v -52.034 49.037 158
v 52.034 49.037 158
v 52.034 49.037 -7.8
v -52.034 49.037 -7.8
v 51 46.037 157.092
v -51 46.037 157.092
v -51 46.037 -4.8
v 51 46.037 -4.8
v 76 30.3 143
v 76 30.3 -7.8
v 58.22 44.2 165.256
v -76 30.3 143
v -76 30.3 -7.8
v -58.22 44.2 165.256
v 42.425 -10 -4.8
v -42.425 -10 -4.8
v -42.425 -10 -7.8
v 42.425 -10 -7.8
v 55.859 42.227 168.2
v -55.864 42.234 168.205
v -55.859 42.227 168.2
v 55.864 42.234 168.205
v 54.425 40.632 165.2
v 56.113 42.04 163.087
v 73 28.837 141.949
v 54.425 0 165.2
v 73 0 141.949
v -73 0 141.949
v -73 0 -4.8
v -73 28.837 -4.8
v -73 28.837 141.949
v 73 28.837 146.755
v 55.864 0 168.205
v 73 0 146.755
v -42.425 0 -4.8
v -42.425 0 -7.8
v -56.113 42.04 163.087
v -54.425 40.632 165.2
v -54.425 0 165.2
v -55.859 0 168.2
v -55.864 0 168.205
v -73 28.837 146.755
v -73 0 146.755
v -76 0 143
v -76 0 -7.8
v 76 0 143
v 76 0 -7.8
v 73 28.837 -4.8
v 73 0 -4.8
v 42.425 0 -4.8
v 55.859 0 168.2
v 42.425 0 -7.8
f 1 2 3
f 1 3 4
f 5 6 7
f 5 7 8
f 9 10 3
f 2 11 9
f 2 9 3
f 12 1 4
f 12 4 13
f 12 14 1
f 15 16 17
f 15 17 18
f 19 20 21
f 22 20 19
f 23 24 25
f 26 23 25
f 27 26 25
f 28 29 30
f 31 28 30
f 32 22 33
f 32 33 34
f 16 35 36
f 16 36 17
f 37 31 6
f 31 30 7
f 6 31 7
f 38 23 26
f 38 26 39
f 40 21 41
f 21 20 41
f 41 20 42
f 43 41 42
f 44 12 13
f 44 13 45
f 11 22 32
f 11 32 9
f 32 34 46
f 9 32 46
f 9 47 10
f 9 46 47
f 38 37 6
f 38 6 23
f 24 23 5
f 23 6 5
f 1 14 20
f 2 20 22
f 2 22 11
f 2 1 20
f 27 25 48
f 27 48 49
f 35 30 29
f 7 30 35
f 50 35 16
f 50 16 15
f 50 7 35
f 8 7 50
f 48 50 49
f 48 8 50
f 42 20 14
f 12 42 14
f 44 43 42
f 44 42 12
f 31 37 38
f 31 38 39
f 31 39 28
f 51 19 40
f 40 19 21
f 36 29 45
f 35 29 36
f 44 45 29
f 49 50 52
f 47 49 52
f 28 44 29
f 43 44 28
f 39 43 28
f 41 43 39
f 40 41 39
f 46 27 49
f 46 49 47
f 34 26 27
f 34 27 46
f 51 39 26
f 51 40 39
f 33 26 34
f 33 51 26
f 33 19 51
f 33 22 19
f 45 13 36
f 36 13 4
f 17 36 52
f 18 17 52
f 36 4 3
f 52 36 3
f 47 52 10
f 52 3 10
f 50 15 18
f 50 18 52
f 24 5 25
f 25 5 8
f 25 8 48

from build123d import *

# Parameters (mm, degrees)
Y_KSEKLIK_EKSTR_ZYON1_DEPTH      = 173
Y_KSEKLIK_EKSTR_ZYON1_DEPTH_BACK = 4.8
KES_EKSTR_ZYON3_DEPTH            = 196.216977169
KES_EKSTR_ZYON3_DEPTH_BACK       = 196.216977169
KES_EKSTR_ZYON6_DEPTH            = 196.216977169
KES_EKSTR_ZYON6_DEPTH_BACK       = 196.216977169
Y_KSEKLIK_EKSTR_ZYON3_DEPTH      = 3
Y_KSEKLIK_EKSTR_ZYON4_DEPTH      = 3
Y_KSEKLIK_EKSTR_ZYON5_DEPTH      = 3
IZIM12_W                         = 111.728887866
IZIM12_H                         = 42.234305359
Y_KSEKLIK_EKSTR_ZYON6_DEPTH      = 3
Y_KSEKLIK_EKSTR_ZYON7_DEPTH      = 3


with BuildPart() as part:
    # Çizim1 → Yükseklik-Ekstrüzyon1 (new, two sides: drawn at the far end of the back side and taken through both)
    with BuildSketch(Plane.XY.offset(-Y_KSEKLIK_EKSTR_ZYON1_DEPTH_BACK)):
        Polygon((52.033537584, 49.037416071), (-52.033537584, 49.037416071), (-76, 30.3), (-76, 0), (-73, 0), (-73, 28.837416071), (-51, 46.037416071), (51, 46.037416071), (73, 28.837416071), (73, 0), (76, 0), (76, 30.3), align=None)
    extrude(amount=Y_KSEKLIK_EKSTR_ZYON1_DEPTH + Y_KSEKLIK_EKSTR_ZYON1_DEPTH_BACK)

    # Çizim5 → Kes-Ekstrüzyon3 (cut, two sides: drawn at the far end of the back side and taken through both)
    with BuildSketch(Plane(origin=(0, 0, 0), x_dir=(0, 0, -1), z_dir=(1, 0, 0)).offset(-KES_EKSTR_ZYON3_DEPTH_BACK)):
        Polygon((-158, 49.037416071), (-173, 39.037416071), (-173, 49.037416071), align=None)
    extrude(amount=KES_EKSTR_ZYON3_DEPTH + KES_EKSTR_ZYON3_DEPTH_BACK, mode=Mode.SUBTRACT)

    # Çizim6 → Kes-Ekstrüzyon6 (cut, two sides: drawn at the far end of the back side and taken through both)
    with BuildSketch(Plane(origin=(0, 0, 0), x_dir=(1, 0, 0), z_dir=(0, 1, 0)).offset(-KES_EKSTR_ZYON6_DEPTH_BACK)):
        Polygon((76, -143), (76, -173), (52.033537584, -173), align=None)
        Polygon((-52.033537584, -173), (-76, -143), (-76, -173), align=None)
    extrude(amount=KES_EKSTR_ZYON6_DEPTH + KES_EKSTR_ZYON6_DEPTH_BACK, mode=Mode.SUBTRACT)

    # Çizim7 → Yükseklik-Ekstrüzyon3 (add)
    with BuildSketch(Plane(origin=(0, 106.87205728, 71.248038187), x_dir=(1, 0, 0), z_dir=(0, 0.8320502943378435, 0.5547001962252296))):
        Polygon((-55.864443933, -116.52736444), (55.864443933, -116.52736444), (58.220440286, -112.982967479), (52.033537584, -104.262882189), (-52.033537584, -104.262882189), (-58.220440286, -112.982967479), align=None)
    extrude(amount=-Y_KSEKLIK_EKSTR_ZYON3_DEPTH)

    # Çizim9 → Yükseklik-Ekstrüzyon4 (add)
    with BuildSketch(Plane(origin=(-116.126649253, 0, 92.771499161), x_dir=(0.6241623263226247, 0, 0.7812946885775748), z_dir=(-0.7812946885775748, 0, 0.6241623263226247))):
        Polygon((92.774277659, 44.200383049), (96.548930908, 42.234305359), (96.548930908, 0), (64.288803666, 0), (64.288803666, 30.3), align=None)
    extrude(amount=-Y_KSEKLIK_EKSTR_ZYON4_DEPTH)

    # Çizim10 → Yükseklik-Ekstrüzyon5 (add)
    with BuildSketch(Plane(origin=(116.126649253, 0, 92.771499161), x_dir=(0.6241623263226247, 0, -0.7812946885775748), z_dir=(0.7812946885775748, 0, 0.6241623263226247))):
        Polygon((-96.548930908, 42.234305359), (-96.548930908, 0), (-64.288803666, 0), (-64.288803666, 30.3), (-92.774277659, 44.200383049), align=None)
    extrude(amount=-Y_KSEKLIK_EKSTR_ZYON5_DEPTH)

    # Çizim12 → Yükseklik-Ekstrüzyon6 (add)
    with BuildSketch(Plane(origin=(0, 0, 168.2), x_dir=(-1, 0, 0), z_dir=(0, 0, -1))):
        with Locations((0, 21.11715268)):
            Rectangle(IZIM12_W, IZIM12_H)
    extrude(amount=Y_KSEKLIK_EKSTR_ZYON6_DEPTH)

    # Çizim13 → Yükseklik-Ekstrüzyon7 (add)
    with BuildSketch(Plane(origin=(0, 0, -4.8), x_dir=(-1, 0, 0), z_dir=(0, 0, -1))):
        Polygon((-76, 30.3), (-52.033537584, 49.037416071), (52.033537584, 49.037416071), (76, 30.3), (76, 0), (42.425, 0), (42.425, -10), (-42.425, -10), (-42.425, 0), (-76, 0), align=None)
    extrude(amount=Y_KSEKLIK_EKSTR_ZYON7_DEPTH)


solid = part.part
